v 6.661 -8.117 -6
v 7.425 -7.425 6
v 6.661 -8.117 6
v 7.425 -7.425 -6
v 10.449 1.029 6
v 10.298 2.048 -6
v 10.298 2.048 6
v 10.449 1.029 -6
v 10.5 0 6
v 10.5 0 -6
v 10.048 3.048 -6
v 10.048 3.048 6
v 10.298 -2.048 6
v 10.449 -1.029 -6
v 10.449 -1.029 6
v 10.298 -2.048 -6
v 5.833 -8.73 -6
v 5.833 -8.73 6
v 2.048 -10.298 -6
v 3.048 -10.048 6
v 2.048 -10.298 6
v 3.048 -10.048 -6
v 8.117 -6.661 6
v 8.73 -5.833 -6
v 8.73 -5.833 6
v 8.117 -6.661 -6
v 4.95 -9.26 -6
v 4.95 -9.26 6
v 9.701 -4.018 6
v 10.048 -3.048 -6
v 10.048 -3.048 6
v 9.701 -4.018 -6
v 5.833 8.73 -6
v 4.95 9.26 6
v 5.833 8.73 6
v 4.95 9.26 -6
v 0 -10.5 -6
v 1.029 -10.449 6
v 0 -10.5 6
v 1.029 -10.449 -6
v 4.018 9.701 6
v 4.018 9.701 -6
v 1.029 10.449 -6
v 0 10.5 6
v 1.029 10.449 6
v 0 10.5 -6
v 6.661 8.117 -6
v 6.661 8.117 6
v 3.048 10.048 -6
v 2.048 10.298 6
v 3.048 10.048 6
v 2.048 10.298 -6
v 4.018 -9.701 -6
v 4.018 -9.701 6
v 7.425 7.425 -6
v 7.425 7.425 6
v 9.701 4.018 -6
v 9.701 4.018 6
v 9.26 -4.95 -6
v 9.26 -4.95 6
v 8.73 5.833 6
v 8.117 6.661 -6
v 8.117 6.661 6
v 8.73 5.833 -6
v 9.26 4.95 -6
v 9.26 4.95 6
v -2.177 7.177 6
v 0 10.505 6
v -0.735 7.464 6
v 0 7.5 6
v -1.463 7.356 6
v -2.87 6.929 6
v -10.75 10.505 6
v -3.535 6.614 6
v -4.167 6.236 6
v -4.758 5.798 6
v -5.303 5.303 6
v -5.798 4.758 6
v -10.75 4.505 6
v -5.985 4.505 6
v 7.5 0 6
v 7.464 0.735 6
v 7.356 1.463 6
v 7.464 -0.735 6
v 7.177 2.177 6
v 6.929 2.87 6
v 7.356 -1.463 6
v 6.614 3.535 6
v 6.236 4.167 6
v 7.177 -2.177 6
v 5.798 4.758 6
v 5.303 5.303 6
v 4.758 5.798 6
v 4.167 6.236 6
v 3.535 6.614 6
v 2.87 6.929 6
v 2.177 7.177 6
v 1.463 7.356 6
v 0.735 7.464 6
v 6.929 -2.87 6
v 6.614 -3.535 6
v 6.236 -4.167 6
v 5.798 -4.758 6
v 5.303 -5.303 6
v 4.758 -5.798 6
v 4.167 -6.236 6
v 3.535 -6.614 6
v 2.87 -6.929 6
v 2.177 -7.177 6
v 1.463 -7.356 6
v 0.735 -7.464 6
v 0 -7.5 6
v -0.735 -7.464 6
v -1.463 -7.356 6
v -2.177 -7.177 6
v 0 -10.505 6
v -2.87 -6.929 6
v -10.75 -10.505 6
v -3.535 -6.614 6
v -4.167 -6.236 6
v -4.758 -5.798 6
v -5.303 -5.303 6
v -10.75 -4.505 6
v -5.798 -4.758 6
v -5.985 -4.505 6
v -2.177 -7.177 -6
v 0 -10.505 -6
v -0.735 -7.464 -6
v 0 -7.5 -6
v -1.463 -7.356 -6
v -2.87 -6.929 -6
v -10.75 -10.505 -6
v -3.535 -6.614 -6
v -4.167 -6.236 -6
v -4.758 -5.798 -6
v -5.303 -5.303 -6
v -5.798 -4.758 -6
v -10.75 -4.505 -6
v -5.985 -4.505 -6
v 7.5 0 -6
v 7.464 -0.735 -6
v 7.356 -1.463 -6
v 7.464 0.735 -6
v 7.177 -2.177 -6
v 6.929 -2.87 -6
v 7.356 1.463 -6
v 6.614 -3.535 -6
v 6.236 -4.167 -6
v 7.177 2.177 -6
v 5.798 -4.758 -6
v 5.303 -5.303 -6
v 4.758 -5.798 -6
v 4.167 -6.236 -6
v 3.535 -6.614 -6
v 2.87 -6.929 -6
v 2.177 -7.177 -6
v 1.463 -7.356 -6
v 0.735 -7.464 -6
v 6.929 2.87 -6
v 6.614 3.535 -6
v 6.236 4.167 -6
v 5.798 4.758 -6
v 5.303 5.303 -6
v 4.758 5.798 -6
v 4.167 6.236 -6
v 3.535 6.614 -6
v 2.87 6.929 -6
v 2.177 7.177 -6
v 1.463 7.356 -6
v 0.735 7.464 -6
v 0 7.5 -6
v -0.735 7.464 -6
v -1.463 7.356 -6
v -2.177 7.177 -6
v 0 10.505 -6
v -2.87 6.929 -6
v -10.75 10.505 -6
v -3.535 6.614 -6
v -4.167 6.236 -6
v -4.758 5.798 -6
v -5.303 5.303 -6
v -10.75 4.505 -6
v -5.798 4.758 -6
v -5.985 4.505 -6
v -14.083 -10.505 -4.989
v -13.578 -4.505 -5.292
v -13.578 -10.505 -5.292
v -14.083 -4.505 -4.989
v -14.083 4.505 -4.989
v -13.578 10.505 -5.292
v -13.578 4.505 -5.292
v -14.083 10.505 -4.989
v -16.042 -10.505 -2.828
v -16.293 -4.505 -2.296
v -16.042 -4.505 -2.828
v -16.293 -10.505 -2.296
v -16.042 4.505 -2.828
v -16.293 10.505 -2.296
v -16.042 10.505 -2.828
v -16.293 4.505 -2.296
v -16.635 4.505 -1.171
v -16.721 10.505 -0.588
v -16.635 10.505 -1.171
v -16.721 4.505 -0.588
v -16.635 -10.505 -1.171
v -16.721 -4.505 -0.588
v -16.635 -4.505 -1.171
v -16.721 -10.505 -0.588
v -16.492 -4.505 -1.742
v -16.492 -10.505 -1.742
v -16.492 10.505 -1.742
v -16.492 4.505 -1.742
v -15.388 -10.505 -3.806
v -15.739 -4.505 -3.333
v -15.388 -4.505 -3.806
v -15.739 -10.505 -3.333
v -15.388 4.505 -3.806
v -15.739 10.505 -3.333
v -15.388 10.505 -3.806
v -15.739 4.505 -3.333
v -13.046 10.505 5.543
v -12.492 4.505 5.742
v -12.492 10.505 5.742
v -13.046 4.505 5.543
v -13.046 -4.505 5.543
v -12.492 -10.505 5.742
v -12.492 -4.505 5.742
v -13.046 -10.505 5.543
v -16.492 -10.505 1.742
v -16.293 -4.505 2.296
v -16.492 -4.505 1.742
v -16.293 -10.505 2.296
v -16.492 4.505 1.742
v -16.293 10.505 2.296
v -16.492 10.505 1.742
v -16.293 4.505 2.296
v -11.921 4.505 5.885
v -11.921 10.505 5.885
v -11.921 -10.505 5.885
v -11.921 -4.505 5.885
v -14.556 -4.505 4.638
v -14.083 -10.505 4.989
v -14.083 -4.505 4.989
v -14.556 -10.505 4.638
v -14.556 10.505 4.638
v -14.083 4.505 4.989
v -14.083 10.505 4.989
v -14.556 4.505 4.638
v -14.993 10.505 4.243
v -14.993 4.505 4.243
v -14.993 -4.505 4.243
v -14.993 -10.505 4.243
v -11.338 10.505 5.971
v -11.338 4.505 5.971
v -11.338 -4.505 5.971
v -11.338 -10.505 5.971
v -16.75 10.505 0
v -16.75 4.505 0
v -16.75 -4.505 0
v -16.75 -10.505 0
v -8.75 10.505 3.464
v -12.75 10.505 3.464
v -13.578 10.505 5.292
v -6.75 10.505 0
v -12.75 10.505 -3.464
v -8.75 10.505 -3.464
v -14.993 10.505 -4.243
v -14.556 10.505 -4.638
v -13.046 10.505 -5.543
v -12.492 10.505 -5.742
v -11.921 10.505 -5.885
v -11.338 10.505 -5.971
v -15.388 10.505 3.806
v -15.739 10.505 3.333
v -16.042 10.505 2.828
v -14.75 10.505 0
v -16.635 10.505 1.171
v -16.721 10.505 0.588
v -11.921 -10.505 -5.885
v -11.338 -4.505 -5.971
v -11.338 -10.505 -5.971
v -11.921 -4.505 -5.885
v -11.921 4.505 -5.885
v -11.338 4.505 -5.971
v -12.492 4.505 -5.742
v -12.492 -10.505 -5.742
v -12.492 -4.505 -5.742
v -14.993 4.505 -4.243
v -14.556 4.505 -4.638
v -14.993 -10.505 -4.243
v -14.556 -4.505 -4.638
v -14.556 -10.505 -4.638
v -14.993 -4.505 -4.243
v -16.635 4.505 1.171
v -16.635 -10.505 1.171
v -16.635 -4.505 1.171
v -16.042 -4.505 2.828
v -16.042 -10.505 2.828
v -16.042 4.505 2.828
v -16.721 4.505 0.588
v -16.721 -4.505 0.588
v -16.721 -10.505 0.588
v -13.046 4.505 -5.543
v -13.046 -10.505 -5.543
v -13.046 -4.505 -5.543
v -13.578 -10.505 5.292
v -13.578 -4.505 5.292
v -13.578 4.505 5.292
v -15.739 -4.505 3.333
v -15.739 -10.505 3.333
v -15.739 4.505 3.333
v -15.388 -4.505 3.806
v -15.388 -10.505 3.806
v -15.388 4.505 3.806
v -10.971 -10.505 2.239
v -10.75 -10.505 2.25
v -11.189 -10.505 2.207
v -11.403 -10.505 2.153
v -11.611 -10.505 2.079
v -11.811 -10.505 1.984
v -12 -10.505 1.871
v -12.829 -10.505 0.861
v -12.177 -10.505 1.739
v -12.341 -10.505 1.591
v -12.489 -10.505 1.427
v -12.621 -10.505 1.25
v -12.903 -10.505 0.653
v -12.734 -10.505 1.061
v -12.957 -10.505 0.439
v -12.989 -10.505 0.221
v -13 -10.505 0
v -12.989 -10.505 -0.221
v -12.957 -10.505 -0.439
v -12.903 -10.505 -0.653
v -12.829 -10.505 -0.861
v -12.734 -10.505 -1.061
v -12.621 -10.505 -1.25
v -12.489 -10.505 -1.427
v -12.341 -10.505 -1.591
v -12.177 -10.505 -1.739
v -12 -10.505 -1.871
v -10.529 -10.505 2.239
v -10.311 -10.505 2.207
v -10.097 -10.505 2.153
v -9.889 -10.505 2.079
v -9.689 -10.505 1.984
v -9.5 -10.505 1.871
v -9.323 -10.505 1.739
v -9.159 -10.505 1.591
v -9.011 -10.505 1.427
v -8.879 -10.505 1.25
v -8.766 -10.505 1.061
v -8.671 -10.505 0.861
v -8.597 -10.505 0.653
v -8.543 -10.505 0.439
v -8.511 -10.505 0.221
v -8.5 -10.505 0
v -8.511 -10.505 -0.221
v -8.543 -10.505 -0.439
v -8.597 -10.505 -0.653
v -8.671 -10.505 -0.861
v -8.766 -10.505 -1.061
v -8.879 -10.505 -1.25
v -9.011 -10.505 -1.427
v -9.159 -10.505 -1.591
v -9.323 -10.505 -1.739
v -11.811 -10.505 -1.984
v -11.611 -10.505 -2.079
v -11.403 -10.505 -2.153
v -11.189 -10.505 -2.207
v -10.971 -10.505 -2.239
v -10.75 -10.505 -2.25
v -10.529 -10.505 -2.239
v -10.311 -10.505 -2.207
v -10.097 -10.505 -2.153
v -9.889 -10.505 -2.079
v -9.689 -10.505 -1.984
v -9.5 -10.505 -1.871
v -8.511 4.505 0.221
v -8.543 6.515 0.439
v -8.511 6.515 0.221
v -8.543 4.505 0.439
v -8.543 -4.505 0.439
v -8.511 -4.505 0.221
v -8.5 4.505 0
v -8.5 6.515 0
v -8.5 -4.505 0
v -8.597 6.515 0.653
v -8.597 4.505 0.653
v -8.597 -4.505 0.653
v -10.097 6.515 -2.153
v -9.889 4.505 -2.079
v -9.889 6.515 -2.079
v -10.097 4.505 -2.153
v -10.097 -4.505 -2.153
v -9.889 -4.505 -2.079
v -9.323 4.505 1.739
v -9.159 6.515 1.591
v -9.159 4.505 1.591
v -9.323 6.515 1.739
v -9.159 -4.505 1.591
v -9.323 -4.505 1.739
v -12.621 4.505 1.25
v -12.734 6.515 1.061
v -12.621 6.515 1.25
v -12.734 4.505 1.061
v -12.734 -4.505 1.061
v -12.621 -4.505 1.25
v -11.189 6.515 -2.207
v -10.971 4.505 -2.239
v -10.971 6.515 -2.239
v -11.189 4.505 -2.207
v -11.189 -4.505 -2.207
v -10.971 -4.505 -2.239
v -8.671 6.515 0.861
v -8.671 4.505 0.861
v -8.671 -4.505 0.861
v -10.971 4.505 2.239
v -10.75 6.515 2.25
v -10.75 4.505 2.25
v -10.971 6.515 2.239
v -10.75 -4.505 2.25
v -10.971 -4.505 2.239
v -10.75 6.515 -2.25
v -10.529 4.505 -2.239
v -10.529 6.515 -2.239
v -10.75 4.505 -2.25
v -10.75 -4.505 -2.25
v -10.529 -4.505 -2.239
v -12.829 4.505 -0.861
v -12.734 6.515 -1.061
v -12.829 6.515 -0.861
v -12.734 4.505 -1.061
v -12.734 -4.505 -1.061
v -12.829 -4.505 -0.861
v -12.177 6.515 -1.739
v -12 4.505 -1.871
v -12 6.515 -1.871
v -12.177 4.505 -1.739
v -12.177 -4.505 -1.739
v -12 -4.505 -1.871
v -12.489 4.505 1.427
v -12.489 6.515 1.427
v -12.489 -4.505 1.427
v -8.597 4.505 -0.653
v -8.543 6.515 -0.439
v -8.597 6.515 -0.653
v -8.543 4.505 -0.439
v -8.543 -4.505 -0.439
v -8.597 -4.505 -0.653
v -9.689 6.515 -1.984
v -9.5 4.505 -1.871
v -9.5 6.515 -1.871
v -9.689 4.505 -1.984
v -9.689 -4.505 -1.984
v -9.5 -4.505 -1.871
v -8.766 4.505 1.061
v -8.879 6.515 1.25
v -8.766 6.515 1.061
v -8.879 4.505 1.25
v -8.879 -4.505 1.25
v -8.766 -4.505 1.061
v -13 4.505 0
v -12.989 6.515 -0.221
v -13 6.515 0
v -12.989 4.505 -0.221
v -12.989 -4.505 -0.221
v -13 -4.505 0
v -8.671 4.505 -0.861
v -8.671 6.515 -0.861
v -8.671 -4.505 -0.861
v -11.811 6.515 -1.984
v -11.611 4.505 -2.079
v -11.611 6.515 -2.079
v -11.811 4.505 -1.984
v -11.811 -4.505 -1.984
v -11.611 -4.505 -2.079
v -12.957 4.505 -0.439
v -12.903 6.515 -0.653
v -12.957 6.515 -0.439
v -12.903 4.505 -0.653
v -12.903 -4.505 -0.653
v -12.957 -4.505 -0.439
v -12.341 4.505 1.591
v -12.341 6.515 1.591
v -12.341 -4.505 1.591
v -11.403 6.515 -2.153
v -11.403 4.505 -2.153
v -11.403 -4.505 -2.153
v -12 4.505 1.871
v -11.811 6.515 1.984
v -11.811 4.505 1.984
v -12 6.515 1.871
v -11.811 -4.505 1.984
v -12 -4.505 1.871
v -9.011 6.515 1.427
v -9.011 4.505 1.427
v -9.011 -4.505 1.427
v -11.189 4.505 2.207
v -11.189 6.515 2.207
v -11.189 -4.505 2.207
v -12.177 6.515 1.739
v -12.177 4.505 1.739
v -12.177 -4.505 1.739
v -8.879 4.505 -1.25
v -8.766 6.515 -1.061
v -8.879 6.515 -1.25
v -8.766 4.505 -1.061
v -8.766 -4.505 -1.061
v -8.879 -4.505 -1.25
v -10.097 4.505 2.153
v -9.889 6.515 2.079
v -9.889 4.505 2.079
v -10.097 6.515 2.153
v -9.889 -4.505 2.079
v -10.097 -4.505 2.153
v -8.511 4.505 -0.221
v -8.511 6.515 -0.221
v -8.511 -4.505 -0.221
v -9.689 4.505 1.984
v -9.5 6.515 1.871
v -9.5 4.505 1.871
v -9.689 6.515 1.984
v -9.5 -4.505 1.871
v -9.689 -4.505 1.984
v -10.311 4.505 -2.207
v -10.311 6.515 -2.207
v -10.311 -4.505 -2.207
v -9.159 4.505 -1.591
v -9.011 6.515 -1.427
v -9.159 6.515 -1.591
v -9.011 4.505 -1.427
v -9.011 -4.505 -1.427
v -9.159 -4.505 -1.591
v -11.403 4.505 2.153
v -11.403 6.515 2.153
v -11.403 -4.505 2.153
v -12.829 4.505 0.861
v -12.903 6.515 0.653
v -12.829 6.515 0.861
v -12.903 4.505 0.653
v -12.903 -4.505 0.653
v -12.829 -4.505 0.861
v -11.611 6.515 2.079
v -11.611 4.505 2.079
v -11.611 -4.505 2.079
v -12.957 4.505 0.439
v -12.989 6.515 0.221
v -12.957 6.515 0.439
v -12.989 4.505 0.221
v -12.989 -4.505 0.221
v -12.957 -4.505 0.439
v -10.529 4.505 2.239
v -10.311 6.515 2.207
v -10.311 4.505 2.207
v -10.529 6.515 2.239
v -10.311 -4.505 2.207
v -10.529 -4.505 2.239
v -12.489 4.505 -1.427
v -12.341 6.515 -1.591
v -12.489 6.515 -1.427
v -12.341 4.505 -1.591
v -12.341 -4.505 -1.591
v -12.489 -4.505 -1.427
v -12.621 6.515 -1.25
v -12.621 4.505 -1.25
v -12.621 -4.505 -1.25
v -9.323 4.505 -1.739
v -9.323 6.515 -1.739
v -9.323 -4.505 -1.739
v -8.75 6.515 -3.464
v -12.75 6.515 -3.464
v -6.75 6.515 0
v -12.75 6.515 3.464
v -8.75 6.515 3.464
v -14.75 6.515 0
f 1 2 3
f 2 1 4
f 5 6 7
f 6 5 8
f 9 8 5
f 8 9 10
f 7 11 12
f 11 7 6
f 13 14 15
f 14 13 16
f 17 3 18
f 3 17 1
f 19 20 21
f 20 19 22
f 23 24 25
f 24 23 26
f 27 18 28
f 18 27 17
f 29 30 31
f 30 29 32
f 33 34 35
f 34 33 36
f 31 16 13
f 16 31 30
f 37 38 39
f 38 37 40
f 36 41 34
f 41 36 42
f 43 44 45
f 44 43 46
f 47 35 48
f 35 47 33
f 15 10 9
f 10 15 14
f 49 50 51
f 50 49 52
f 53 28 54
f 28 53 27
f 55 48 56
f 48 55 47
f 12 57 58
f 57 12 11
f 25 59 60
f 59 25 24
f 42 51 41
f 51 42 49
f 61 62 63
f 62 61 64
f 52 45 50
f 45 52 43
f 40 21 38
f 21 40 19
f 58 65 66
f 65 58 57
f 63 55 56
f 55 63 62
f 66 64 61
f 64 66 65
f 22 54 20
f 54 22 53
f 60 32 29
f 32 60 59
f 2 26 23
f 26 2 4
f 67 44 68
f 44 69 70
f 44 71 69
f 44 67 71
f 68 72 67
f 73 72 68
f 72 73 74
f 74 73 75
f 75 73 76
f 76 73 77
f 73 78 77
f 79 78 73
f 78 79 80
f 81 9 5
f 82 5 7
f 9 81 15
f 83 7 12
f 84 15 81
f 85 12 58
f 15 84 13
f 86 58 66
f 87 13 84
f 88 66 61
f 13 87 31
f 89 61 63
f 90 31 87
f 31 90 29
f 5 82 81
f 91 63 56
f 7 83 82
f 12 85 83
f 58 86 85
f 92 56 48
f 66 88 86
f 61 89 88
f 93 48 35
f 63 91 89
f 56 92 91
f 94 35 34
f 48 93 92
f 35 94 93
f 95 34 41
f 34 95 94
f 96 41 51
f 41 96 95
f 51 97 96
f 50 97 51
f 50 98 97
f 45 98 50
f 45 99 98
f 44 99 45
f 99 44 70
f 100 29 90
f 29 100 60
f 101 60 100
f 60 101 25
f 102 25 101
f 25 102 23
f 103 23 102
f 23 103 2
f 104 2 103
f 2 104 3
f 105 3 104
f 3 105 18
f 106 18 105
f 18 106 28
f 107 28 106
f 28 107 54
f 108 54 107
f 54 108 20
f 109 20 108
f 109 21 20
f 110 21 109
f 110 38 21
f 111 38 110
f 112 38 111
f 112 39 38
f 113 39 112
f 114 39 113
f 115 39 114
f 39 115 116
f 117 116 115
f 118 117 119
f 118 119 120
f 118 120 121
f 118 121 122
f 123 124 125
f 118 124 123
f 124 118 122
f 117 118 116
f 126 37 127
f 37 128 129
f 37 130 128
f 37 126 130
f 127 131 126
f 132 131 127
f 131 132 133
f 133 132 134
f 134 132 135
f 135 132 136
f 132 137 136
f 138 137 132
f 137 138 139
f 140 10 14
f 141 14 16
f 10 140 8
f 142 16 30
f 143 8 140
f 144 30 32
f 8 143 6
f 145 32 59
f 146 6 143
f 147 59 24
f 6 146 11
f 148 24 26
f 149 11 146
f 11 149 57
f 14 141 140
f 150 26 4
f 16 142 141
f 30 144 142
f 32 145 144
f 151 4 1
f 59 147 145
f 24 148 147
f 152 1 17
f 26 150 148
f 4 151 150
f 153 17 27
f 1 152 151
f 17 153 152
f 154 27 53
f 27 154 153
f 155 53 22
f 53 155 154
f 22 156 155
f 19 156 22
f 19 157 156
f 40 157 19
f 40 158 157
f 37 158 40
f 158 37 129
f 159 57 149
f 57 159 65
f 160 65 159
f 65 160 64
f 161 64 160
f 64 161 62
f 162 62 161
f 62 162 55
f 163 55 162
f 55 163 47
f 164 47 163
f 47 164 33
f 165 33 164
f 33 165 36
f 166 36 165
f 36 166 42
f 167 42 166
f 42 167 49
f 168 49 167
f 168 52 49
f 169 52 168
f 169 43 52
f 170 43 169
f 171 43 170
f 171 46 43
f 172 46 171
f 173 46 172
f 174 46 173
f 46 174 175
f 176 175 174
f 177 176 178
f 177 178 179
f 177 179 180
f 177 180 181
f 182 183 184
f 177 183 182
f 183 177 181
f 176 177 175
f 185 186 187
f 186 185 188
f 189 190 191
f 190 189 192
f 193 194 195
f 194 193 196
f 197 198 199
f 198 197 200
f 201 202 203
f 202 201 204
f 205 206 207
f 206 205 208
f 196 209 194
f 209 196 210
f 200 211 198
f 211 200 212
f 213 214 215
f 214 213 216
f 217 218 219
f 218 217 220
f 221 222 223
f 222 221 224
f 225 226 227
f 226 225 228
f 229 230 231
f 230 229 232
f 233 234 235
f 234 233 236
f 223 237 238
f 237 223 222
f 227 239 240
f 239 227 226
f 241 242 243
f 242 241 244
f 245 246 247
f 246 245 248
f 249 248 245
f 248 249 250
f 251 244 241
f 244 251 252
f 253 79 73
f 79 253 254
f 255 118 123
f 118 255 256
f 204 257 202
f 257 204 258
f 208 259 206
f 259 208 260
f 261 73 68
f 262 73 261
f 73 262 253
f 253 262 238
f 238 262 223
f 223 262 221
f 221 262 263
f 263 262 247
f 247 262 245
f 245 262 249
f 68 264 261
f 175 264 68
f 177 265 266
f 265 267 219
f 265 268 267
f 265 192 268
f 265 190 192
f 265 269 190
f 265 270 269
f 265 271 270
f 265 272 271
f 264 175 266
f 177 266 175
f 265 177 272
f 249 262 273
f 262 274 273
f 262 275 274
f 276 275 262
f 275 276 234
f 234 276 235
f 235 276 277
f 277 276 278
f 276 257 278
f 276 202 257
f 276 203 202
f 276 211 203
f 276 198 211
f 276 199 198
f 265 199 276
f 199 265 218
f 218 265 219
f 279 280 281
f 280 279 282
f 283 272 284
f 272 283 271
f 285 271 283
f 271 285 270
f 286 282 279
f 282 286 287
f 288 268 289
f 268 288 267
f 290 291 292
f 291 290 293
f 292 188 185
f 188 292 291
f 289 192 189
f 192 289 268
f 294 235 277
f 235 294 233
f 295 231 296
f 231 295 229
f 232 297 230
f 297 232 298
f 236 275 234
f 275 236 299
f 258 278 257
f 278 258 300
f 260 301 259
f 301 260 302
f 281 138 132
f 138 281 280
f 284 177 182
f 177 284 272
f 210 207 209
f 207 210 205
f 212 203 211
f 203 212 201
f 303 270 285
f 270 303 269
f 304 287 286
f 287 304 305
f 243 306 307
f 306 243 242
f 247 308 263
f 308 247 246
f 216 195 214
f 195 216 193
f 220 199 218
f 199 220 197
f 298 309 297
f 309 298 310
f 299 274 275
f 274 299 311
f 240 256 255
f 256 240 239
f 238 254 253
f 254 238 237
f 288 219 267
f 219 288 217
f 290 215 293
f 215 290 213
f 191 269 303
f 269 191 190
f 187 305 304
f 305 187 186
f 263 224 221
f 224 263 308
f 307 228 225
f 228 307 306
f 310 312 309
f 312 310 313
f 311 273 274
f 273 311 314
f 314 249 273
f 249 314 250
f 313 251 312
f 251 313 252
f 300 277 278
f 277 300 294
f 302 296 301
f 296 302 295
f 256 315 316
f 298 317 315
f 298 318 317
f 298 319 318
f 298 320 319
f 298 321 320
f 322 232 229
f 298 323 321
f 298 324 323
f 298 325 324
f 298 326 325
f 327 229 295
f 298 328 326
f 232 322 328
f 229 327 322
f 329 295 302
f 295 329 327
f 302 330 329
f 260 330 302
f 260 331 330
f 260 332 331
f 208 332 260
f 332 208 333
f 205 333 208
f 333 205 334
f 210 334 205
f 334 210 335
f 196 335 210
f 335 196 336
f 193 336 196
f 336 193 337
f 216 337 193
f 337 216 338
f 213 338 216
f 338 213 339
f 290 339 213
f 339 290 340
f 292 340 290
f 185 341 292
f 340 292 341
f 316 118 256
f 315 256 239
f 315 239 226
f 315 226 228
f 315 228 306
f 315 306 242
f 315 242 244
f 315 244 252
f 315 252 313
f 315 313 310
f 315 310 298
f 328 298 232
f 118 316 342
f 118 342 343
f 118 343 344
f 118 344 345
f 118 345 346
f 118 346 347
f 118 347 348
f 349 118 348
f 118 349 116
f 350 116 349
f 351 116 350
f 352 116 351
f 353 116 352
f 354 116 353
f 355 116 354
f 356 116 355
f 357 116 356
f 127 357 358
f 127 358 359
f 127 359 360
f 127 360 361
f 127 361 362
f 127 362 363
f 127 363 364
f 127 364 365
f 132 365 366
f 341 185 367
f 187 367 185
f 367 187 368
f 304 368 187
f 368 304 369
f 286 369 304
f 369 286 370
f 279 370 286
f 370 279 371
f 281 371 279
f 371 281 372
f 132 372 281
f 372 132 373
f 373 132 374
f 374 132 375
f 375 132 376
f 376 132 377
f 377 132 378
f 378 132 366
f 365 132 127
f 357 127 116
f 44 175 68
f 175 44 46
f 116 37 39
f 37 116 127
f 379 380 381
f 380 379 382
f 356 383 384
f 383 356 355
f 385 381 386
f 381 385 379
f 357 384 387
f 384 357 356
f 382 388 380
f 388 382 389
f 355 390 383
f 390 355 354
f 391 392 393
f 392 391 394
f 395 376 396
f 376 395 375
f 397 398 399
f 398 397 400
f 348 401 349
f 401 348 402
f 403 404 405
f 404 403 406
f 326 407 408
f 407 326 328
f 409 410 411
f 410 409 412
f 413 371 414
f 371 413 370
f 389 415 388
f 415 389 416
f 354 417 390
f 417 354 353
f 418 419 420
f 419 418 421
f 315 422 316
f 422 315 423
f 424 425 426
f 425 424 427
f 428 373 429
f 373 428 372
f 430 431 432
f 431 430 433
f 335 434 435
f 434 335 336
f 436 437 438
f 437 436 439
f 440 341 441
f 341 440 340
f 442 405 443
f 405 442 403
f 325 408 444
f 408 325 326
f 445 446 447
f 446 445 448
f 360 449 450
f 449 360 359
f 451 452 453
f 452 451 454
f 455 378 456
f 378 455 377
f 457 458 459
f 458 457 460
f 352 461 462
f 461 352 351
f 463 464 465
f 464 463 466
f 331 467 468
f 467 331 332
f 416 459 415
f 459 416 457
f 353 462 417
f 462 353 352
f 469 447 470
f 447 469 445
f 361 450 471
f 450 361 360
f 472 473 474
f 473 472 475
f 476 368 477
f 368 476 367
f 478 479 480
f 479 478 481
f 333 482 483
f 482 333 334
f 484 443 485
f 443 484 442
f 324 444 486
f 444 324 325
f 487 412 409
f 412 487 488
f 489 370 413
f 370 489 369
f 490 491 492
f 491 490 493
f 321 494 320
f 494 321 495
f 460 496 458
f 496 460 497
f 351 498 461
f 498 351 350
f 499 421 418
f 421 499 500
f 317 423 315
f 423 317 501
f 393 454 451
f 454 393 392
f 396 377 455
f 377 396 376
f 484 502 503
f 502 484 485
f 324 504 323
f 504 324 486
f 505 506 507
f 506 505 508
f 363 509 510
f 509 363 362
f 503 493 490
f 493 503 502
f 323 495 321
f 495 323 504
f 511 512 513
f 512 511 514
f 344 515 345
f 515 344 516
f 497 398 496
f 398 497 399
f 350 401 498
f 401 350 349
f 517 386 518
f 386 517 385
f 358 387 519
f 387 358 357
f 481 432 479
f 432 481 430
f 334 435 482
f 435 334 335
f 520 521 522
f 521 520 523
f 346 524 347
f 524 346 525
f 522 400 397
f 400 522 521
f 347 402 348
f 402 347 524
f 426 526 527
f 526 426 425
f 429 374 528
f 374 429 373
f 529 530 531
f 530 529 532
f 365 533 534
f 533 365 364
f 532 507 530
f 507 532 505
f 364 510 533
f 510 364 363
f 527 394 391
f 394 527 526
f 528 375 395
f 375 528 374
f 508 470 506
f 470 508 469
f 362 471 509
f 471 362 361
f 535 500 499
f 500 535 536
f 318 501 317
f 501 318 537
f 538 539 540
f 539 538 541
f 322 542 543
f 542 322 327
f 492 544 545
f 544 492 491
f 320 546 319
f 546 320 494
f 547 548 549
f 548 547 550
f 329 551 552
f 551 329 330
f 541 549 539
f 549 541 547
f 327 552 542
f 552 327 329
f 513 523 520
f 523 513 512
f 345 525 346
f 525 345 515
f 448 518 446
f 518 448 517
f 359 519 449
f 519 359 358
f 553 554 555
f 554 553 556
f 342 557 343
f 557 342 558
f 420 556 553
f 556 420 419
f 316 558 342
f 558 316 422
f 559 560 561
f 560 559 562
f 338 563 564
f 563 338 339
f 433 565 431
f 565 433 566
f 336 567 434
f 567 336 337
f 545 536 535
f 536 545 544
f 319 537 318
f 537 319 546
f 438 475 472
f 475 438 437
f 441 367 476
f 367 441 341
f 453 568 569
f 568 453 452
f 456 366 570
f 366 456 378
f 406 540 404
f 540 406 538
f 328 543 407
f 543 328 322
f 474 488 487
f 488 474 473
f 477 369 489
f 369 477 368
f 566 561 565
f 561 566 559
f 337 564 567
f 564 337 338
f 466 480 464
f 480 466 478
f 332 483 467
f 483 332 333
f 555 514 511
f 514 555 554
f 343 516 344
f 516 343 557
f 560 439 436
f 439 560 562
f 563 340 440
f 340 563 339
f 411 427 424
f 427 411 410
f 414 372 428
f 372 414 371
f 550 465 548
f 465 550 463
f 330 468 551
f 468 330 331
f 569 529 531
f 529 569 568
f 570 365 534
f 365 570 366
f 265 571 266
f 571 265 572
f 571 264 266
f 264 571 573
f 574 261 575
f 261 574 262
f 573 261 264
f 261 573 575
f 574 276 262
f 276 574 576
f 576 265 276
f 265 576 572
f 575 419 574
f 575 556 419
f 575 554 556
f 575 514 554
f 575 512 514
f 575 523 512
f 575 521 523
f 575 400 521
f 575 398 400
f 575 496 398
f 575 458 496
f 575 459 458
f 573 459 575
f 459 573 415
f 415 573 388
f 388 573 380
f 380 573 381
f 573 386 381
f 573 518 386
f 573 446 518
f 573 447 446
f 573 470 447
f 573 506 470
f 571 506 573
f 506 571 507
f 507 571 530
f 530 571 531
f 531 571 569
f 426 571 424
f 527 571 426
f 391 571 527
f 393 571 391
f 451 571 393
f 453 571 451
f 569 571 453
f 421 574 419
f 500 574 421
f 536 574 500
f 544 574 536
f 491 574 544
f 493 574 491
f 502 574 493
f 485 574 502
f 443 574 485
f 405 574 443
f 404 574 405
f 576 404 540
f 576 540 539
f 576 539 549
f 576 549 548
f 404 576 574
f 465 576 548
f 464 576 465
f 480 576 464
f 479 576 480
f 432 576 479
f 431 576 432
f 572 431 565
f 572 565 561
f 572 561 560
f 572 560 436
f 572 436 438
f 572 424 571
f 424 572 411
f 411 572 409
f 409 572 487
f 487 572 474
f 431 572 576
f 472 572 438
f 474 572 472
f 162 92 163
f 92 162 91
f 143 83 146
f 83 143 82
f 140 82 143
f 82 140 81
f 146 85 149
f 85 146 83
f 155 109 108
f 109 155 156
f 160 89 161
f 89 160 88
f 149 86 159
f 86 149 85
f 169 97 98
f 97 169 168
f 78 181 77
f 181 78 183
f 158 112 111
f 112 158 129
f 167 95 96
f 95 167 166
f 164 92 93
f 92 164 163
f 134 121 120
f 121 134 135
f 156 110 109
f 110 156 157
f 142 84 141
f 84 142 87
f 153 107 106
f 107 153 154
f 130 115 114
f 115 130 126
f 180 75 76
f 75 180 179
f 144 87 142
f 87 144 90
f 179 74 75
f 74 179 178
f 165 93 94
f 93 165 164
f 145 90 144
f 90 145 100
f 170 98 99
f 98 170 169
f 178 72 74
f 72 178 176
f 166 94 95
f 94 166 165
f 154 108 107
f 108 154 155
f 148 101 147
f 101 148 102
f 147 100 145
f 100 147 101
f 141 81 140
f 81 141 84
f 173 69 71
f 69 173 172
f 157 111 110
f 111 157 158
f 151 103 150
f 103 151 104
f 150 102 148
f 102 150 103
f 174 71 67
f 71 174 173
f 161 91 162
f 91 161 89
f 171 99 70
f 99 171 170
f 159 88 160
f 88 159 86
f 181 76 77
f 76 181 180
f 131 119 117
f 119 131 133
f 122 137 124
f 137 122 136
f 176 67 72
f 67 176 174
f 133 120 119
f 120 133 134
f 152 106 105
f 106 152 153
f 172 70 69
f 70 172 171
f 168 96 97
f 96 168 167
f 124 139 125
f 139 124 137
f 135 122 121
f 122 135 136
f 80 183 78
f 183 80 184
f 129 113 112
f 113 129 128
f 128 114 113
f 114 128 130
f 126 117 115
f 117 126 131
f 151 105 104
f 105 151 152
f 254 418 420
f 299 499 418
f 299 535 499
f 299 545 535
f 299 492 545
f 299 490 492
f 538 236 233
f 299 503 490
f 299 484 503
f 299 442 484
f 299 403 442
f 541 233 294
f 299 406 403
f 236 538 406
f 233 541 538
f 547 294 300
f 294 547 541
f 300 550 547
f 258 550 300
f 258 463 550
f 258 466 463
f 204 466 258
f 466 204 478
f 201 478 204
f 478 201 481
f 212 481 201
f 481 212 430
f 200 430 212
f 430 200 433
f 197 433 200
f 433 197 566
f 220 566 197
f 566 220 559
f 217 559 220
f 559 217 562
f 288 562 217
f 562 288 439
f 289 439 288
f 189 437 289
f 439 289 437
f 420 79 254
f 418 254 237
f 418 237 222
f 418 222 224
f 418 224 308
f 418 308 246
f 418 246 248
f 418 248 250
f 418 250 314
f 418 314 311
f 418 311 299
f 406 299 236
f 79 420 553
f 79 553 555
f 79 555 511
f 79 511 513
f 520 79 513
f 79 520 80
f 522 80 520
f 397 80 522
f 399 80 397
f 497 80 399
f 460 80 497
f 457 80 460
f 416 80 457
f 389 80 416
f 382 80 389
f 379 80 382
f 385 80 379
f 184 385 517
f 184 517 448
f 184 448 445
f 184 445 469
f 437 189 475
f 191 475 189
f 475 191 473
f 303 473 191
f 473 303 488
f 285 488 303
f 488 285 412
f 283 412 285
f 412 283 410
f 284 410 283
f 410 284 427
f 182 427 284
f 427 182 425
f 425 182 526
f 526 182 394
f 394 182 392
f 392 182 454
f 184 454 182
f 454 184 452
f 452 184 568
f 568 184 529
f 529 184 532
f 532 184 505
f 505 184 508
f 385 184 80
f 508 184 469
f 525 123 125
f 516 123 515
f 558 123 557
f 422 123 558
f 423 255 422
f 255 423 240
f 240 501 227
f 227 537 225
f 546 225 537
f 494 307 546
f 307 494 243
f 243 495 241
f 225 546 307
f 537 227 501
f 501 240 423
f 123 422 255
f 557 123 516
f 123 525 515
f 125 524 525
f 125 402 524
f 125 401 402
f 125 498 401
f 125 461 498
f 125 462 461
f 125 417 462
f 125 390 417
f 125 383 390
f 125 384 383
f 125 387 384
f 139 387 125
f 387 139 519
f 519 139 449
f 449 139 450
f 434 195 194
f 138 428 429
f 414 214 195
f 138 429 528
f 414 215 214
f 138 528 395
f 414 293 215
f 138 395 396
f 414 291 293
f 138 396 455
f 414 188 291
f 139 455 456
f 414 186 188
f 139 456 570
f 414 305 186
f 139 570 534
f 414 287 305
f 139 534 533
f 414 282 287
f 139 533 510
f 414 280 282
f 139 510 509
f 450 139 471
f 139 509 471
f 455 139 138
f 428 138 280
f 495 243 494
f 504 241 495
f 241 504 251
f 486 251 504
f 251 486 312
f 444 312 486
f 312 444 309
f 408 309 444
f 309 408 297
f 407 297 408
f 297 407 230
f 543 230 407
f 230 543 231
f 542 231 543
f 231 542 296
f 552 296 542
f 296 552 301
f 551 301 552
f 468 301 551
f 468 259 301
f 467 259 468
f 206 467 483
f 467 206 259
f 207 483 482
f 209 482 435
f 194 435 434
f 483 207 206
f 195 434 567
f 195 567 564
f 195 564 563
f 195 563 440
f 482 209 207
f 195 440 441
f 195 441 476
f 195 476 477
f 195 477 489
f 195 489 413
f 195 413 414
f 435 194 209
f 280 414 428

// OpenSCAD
$fa = 1 / 1;
$fs = 1 / 1;
$fn = 64;
bissl = 1 / 100;
alot = 200 / 1;

part="single_clamp_straight";//[single_clamp_straight,double_clamp,spacer]

tube = 15;      // rod outer diameter
wall_round = 3; // thin wall of the clamping part itself
wall = 6;       // thicker wall, that needs to hold nuts (of threaded inserts)
part_thickness = 12; // how wide the clamping ring is
rod_distance = 60;   // center distance between rods
tube_to_bolt = 4;    // extra distance from tube to the clamping screw
skew = 30;           // andle at which the part is skewed

min_hole_distance = 4; // from center of the hole to the wall boundaries
bolt_d = 4.5;            // hole diameter
nut_d = 8;             // place for inserting hexagonal nuts, corner-to-corner
depth = 2;             // thickness of part of the wall, that holds the nut
raster = 10;           // distance between rows and columns of holes
spacer_skew=22;
spacer_height = 30;
spacer_thickness=9;

module clamp(tube, wall_round, wall, part_thickness, tube_to_bolt, bolt_d, skew = skew,
             negative = false) {
  width =
      (tube + 2 * wall_round) / cos(skew) - part_thickness * tan(skew) + bissl;
  if (!negative) { // positive part, which can be combined with other stuff
    intersection() {
      rotate([ skew, 0, 0 ])
          cylinder(d = tube + 2 * wall_round, alot, center = true);
      cube([ tube + 2 * wall_round, alot, part_thickness ], center = true);
    }
    translate([ -(tube / 2 + tube_to_bolt + bolt_d / 2), 0, 0 ])
        rotate([ 90, 90, 0 ])
            cylinder(d = part_thickness, h = width, center = true);
    translate([
      -(tube / 2 + tube_to_bolt + bolt_d / 2), -width / 2, -part_thickness / 2
    ]) cube([ (tube / 2 + tube_to_bolt + bolt_d / 2), width, part_thickness ]);
  }
  if (negative) { // negative part, which needs to be subtracted from the
                  // combined part after intersection() of hull()
    rotate([ skew, 0, 0 ]) cylinder(d = tube, h = alot, center = true);
    translate([ -alot / 2, 0, 0 ])
        cube([ alot, width - 2 * wall, part_thickness + bissl ], center = true);
    translate([ -(tube / 2 + tube_to_bolt + bolt_d / 2), width / 2, 0 ])
        rotate([ 90, 0, 0 ]) hole();
  }
}

module hole(wall = wall, depth = depth) {
  translate([ 0, 0, -bissl ]) cylinder(d = bolt_d, h = alot);
  translate([ 0, 0, -bissl ]) cylinder(d = nut_d, h = wall - depth, $fn = 6);
}

module single_clamp(tube, wall_round, wall, part_thickness, tube_to_bolt,
                    bolt_d,skew) {
  difference() {
    clamp(tube = tube, wall_round = wall_round, wall = wall,
          part_thickness = part_thickness, tube_to_bolt = tube_to_bolt,
          bolt_d = bolt_d, skew = skew);
    clamp(tube = tube, wall_round = wall_round, wall = wall,
          part_thickness = part_thickness, tube_to_bolt = tube_to_bolt,
          bolt_d = bolt_d, skew = skew, negative = true);
  }
}

module bridge(wall_bridge, nuts = true) {
  intersection() {
    cube([ alot, alot, part_thickness ], center = true);
    rotate([ skew, 0, 0 ]) difference() {
      translate([ -rod_distance / 2, -tube / 2 - wall_round, -alot / 2 ])
          cube([ rod_distance, wall_bridge, alot ]);
      if (nuts)
        for (x = [-raster:raster:raster])
          translate([ x, -tube / 2 - wall / 2 + wall_bridge, raster / 2 ])
              rotate([ 90, 90, 0 ]) hole();
      if (!nuts)
        for (x = [-raster:raster:raster])
          translate([ x, -tube / 2 - wall / 2 + wall_bridge, raster / 2 ])
              rotate([ 90, 90, 0 ])
                  cylinder(d = bolt_d, h = alot, center = true);
    }
  }
}

module double_clamp(skew = skew) {
  difference() {
    union() {
      translate([ -rod_distance / 2, 0, 0 ])
          clamp(tube = tube, wall_round = wall_round, wall = wall,
                part_thickness = part_thickness, tube_to_bolt = tube_to_bolt,
                bolt_d = bolt_d);
      translate([ rod_distance / 2, 0, 0 ]) mirror([ 1, 0, 0 ])
          clamp(tube = tube, wall_round = wall_round, wall = wall,
                part_thickness = part_thickness, tube_to_bolt = tube_to_bolt,
                bolt_d = bolt_d);
      bridge(wall_bridge = wall);
      rotate([ 180, 0, 0 ]) bridge(wall_bridge = wall, nuts = false);
    }
    translate([ -rod_distance / 2, 0, 0 ])
        clamp(tube = tube, wall_round = wall_round, wall = wall,
              part_thickness = part_thickness, tube_to_bolt = tube_to_bolt,
              bolt_d = bolt_d, negative = true);
    translate([ rod_distance / 2, 0, 0 ]) mirror([ 1, 0, 0 ])
        clamp(tube = tube, wall_round = wall_round, wall = wall,
              part_thickness = part_thickness, tube_to_bolt = tube_to_bolt,
              bolt_d = bolt_d, negative = true);
  }
}

module spacer(spacer_height=spacer_height, spacer_thickness=spacer_thickness, skew = skew) {
  intersection() {
    cube([ alot, alot, spacer_thickness ], center = true);
    rotate([skew,0,0]) difference() {
      hull() {
        translate([-rod_distance/2,0,0]) cylinder (d=spacer_height, h=alot,center=true);
        translate([rod_distance/2,0,0]) cylinder (d=spacer_height, h=alot,center=true);
      }
      hull() {
        translate([-rod_distance/2,0,0]) cylinder (d=spacer_height-2*wall, h=alot,center=true);
        translate([rod_distance/2,0,0]) cylinder (d=spacer_height-2*wall, h=alot,center=true);
      }
      for (x=[-raster:raster:raster]) for (z=[-2.5*raster:raster:3*raster]) translate([x,0,z]) {
        rotate([90,0,0])cylinder(d=bolt_d,h=alot,center=true);
        rotate([90,0,0])translate([0,0,(spacer_height-2*wall)/2-bissl])cylinder(d=nut_d,h=wall-depth,$fn=6);
      }
    }
  }
}
if (part=="single_clamp_straight")
single_clamp(tube=tube, wall_round=wall_round, wall=wall, part_thickness=part_thickness, tube_to_bolt=1,
                    bolt_d=bolt_d, skew = 0);
if (part=="double_clamp") double_clamp(skew = skew);
if (part=="spacer") spacer(spacer_height=spacer_height,spacer_thickness=spacer_thickness, skew = spacer_skew);
